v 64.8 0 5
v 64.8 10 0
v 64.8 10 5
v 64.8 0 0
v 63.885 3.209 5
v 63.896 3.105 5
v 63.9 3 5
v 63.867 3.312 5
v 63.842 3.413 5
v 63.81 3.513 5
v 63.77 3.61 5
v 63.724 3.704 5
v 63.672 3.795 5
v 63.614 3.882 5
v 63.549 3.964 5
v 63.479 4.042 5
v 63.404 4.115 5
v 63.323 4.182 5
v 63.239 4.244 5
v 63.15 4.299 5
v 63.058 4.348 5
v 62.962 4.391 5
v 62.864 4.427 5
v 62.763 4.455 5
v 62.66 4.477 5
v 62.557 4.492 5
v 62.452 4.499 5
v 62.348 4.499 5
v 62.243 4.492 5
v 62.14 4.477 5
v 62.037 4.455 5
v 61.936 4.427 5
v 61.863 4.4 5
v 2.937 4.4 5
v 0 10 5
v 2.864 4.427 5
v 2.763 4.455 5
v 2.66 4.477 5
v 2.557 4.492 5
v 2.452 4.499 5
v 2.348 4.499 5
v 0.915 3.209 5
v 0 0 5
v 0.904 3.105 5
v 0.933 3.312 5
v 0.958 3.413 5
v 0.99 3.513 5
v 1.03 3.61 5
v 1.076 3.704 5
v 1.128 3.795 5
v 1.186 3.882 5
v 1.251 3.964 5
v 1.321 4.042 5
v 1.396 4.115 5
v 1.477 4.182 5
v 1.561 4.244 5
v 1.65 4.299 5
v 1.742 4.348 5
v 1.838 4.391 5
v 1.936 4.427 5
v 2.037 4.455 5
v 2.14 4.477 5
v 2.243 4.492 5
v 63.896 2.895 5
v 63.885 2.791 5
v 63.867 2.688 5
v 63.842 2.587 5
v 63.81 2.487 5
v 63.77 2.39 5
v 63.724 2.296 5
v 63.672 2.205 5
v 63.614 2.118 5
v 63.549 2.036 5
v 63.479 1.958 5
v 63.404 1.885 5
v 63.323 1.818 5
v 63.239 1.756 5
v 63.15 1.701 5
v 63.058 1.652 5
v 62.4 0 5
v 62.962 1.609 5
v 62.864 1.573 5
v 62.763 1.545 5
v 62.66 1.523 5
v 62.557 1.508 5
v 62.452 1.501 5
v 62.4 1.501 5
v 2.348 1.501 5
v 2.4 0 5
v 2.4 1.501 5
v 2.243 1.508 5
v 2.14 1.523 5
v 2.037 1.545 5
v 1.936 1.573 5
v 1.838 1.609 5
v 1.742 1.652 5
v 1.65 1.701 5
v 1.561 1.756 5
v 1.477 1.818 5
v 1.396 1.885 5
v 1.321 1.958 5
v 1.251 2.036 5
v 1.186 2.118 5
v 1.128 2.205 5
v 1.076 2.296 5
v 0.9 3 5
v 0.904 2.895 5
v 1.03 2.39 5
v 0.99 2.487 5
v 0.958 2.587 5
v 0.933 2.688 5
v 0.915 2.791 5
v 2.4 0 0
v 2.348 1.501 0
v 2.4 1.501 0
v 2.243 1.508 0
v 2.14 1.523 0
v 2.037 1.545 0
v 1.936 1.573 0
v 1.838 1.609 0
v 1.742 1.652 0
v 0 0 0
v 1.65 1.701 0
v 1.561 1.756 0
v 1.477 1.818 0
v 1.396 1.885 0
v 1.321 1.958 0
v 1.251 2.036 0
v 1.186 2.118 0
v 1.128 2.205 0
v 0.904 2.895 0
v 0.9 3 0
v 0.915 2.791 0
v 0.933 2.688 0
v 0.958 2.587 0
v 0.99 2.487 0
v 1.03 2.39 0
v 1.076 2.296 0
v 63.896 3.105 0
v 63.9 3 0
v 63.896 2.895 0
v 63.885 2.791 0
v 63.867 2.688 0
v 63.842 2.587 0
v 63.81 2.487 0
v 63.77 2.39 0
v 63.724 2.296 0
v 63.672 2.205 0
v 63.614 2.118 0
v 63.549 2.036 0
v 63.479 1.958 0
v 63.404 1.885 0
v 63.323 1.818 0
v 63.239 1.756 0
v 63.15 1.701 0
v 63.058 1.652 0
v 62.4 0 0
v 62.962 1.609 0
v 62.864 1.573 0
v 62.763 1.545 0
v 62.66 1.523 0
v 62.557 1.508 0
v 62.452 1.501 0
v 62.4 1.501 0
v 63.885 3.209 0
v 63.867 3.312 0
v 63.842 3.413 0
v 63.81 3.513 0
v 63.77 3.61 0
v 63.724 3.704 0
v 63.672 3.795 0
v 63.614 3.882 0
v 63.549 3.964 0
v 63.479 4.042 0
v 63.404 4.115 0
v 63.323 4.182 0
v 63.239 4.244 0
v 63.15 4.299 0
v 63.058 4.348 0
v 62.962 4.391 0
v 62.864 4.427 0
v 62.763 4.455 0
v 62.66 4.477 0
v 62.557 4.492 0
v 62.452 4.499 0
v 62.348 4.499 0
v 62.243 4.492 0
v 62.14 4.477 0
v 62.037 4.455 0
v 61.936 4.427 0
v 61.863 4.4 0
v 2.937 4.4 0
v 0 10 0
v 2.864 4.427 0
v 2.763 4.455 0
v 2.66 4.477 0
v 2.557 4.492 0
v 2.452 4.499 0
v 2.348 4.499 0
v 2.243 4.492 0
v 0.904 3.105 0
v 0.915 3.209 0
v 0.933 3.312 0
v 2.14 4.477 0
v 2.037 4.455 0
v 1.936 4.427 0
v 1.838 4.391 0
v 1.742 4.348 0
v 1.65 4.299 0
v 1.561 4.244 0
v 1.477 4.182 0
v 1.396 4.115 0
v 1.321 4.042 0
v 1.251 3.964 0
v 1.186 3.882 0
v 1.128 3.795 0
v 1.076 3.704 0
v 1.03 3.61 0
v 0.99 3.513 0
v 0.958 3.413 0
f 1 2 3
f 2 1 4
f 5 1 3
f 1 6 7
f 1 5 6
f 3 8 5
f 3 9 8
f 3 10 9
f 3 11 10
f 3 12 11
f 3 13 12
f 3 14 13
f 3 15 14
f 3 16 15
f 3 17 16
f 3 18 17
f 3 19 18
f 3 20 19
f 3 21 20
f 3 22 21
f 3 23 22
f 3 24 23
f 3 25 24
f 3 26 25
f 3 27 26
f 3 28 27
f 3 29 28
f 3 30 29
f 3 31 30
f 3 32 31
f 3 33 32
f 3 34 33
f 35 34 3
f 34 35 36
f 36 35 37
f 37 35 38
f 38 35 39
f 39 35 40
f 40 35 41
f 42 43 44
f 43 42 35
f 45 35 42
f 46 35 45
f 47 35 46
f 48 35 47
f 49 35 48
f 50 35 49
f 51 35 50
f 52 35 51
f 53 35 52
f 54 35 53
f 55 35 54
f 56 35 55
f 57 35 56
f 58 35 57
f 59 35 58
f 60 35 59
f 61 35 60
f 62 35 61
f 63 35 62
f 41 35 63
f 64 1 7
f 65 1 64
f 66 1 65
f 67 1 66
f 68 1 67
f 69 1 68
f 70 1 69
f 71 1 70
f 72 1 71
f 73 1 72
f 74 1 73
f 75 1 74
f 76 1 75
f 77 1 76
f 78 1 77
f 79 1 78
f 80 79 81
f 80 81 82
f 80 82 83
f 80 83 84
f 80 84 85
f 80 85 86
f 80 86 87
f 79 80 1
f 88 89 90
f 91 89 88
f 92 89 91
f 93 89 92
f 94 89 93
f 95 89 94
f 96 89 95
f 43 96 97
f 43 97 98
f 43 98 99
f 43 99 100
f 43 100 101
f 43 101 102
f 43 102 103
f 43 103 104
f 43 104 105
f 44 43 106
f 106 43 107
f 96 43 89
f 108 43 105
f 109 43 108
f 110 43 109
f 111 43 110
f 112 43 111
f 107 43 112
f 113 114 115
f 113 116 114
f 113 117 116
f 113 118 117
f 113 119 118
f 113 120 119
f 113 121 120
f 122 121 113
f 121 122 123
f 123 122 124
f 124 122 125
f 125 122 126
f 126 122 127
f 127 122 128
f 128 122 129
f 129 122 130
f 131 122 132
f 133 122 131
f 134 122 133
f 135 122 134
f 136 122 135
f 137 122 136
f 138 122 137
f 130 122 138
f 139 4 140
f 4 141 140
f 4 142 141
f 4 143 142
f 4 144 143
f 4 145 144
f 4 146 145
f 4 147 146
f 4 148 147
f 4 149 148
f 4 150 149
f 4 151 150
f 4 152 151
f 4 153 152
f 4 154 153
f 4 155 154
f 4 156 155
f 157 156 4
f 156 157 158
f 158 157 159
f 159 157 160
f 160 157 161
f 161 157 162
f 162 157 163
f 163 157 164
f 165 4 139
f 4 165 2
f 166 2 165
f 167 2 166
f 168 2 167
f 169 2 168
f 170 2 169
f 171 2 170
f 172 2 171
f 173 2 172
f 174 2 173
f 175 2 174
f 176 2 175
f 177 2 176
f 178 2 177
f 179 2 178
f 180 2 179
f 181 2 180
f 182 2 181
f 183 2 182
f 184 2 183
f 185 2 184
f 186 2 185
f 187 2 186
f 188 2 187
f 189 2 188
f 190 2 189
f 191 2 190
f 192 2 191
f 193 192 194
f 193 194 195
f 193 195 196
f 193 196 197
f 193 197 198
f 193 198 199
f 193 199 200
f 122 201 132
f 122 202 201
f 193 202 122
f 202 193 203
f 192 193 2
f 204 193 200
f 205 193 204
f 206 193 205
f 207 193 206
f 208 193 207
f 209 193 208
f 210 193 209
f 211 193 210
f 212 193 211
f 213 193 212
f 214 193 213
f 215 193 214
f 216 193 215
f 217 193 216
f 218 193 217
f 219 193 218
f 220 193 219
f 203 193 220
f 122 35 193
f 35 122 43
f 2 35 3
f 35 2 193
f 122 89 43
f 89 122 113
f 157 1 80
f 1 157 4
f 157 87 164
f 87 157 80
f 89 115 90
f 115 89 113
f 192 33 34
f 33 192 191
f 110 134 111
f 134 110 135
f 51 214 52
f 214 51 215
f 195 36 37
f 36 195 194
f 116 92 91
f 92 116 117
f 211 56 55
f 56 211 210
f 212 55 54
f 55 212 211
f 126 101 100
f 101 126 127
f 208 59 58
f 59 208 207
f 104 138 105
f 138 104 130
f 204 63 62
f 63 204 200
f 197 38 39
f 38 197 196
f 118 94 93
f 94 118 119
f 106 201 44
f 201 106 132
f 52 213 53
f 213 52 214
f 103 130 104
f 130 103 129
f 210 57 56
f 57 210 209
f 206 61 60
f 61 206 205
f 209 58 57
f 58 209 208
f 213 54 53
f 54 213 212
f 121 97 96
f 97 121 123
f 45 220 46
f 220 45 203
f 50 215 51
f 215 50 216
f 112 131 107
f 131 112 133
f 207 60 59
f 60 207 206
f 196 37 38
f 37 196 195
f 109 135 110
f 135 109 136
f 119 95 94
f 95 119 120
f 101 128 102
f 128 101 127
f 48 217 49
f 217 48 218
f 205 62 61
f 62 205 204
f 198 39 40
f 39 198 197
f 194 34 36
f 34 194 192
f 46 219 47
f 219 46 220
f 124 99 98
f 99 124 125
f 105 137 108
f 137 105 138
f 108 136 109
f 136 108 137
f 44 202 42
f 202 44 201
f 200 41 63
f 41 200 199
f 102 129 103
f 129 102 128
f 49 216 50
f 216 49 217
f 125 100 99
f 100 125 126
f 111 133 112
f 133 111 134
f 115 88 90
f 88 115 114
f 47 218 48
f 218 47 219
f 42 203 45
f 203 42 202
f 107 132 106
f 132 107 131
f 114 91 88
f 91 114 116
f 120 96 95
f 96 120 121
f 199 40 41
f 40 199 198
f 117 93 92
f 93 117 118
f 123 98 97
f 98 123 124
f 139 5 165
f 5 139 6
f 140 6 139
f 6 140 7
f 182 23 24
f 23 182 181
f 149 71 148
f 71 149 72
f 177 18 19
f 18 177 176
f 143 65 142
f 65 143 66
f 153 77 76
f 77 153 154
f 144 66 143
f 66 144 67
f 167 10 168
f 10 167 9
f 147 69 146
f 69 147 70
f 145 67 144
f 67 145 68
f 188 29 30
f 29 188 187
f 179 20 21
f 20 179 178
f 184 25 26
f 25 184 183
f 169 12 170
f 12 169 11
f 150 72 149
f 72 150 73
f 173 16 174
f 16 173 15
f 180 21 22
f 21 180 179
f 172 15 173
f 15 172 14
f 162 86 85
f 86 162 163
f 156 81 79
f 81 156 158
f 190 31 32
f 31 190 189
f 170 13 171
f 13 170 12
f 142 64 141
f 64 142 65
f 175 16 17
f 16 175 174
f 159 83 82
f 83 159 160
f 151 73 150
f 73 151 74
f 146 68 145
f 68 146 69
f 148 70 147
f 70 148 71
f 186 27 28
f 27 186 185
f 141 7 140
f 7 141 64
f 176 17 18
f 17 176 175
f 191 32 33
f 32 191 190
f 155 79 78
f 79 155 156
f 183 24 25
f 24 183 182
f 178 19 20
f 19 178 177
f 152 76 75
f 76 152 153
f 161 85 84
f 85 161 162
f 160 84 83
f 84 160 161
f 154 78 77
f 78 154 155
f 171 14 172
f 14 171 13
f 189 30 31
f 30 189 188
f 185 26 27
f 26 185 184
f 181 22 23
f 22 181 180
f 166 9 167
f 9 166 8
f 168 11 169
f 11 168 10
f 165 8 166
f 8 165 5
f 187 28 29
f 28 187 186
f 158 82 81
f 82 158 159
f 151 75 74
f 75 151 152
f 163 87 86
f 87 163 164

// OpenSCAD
// file: ../../modules/fillet.scad
module fillet(r, l) {
  difference() {
    cube([r, r, l]);
    translate([0, 0, -.1]) cylinder(h = l + .2, r = r);
  }
}
// main file
include <../../modules/fillet.scad>

$fa=4; // default minimum facet angle is now 0.5
$fs=0.05; // default minimum facet size is now 0.05 mm


railDiam = 3;
width = 5;
railDistance = 30;
wallThickness = 2.4;
height = 10;

difference() {
  cube([railDistance * 2 + wallThickness * 2, height, width]);
  translate([wallThickness, -.1, -.1]) cube([railDistance * 2, railDiam * 1.5, width + .2]);
  translate([wallThickness, railDiam, -.1]) cylinder(r = railDiam / 2, h = width + .2);
  translate([wallThickness + railDistance * 2, railDiam, -.1]) cylinder(r = railDiam / 2, h = width + .2);
}
